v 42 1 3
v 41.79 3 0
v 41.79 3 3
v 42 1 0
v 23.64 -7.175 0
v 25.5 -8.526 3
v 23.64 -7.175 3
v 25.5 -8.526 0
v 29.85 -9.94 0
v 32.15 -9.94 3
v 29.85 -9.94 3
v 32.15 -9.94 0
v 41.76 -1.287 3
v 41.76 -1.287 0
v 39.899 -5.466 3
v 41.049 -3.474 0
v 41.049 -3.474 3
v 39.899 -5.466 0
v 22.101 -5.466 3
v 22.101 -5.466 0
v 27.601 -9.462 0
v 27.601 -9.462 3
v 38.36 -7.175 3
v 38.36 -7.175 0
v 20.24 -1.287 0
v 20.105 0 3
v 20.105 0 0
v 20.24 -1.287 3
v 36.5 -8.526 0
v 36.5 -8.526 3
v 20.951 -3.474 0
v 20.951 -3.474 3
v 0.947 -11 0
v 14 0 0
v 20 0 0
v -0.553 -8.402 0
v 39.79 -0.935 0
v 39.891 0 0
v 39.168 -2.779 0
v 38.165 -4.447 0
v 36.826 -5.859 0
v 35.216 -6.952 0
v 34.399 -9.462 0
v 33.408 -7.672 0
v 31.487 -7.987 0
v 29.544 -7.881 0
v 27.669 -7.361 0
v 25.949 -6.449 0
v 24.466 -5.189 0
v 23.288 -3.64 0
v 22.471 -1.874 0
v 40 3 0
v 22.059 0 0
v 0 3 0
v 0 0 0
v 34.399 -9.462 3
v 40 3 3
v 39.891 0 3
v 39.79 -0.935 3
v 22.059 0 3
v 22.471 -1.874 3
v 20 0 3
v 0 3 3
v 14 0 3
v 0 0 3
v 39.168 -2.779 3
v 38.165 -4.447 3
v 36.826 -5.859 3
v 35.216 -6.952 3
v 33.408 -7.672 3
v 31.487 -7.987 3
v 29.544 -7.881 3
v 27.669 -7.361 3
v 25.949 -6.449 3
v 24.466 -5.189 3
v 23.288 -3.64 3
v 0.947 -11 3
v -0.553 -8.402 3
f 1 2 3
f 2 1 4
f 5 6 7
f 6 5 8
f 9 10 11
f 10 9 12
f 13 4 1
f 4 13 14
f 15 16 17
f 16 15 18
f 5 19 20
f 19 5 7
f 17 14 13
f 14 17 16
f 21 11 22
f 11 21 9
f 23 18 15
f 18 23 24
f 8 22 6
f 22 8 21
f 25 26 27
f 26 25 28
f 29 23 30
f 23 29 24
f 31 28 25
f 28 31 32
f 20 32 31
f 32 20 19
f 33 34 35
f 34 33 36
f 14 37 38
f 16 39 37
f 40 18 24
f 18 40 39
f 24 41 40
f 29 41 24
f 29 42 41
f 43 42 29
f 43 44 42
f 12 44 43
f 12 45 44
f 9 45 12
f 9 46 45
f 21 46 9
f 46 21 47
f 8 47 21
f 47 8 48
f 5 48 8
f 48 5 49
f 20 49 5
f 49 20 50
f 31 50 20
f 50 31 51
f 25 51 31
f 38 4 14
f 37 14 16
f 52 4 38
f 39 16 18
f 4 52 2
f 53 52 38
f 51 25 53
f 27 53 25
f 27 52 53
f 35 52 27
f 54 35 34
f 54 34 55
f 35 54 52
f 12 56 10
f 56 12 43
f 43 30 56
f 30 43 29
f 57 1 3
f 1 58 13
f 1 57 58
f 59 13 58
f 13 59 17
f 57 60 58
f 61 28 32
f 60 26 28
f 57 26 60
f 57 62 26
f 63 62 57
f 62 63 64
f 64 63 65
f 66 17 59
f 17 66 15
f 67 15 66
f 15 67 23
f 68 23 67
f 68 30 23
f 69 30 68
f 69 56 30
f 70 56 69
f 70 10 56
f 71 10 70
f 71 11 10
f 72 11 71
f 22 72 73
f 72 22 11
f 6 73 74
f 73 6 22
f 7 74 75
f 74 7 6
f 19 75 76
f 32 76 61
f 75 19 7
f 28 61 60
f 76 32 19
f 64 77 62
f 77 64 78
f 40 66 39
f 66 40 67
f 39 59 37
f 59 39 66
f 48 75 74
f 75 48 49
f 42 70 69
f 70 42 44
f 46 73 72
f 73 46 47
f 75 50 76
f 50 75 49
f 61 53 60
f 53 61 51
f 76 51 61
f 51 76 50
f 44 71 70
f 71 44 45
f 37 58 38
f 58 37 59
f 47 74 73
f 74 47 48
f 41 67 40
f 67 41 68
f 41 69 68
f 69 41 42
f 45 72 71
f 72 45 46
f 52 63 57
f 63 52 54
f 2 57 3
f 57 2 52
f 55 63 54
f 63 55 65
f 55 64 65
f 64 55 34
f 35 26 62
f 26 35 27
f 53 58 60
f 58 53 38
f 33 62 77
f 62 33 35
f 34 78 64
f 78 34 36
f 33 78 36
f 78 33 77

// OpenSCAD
cube([40,3,3]);
difference(){
translate([31,1,0])
cylinder(3,11,11);
translate([31,1,-1])
cylinder(4,9,9);
translate([0,3,0])
cube([50,10,3]);
}
translate([20,0,3])
rotate([0,180,30])
cube([22,3,3]);
